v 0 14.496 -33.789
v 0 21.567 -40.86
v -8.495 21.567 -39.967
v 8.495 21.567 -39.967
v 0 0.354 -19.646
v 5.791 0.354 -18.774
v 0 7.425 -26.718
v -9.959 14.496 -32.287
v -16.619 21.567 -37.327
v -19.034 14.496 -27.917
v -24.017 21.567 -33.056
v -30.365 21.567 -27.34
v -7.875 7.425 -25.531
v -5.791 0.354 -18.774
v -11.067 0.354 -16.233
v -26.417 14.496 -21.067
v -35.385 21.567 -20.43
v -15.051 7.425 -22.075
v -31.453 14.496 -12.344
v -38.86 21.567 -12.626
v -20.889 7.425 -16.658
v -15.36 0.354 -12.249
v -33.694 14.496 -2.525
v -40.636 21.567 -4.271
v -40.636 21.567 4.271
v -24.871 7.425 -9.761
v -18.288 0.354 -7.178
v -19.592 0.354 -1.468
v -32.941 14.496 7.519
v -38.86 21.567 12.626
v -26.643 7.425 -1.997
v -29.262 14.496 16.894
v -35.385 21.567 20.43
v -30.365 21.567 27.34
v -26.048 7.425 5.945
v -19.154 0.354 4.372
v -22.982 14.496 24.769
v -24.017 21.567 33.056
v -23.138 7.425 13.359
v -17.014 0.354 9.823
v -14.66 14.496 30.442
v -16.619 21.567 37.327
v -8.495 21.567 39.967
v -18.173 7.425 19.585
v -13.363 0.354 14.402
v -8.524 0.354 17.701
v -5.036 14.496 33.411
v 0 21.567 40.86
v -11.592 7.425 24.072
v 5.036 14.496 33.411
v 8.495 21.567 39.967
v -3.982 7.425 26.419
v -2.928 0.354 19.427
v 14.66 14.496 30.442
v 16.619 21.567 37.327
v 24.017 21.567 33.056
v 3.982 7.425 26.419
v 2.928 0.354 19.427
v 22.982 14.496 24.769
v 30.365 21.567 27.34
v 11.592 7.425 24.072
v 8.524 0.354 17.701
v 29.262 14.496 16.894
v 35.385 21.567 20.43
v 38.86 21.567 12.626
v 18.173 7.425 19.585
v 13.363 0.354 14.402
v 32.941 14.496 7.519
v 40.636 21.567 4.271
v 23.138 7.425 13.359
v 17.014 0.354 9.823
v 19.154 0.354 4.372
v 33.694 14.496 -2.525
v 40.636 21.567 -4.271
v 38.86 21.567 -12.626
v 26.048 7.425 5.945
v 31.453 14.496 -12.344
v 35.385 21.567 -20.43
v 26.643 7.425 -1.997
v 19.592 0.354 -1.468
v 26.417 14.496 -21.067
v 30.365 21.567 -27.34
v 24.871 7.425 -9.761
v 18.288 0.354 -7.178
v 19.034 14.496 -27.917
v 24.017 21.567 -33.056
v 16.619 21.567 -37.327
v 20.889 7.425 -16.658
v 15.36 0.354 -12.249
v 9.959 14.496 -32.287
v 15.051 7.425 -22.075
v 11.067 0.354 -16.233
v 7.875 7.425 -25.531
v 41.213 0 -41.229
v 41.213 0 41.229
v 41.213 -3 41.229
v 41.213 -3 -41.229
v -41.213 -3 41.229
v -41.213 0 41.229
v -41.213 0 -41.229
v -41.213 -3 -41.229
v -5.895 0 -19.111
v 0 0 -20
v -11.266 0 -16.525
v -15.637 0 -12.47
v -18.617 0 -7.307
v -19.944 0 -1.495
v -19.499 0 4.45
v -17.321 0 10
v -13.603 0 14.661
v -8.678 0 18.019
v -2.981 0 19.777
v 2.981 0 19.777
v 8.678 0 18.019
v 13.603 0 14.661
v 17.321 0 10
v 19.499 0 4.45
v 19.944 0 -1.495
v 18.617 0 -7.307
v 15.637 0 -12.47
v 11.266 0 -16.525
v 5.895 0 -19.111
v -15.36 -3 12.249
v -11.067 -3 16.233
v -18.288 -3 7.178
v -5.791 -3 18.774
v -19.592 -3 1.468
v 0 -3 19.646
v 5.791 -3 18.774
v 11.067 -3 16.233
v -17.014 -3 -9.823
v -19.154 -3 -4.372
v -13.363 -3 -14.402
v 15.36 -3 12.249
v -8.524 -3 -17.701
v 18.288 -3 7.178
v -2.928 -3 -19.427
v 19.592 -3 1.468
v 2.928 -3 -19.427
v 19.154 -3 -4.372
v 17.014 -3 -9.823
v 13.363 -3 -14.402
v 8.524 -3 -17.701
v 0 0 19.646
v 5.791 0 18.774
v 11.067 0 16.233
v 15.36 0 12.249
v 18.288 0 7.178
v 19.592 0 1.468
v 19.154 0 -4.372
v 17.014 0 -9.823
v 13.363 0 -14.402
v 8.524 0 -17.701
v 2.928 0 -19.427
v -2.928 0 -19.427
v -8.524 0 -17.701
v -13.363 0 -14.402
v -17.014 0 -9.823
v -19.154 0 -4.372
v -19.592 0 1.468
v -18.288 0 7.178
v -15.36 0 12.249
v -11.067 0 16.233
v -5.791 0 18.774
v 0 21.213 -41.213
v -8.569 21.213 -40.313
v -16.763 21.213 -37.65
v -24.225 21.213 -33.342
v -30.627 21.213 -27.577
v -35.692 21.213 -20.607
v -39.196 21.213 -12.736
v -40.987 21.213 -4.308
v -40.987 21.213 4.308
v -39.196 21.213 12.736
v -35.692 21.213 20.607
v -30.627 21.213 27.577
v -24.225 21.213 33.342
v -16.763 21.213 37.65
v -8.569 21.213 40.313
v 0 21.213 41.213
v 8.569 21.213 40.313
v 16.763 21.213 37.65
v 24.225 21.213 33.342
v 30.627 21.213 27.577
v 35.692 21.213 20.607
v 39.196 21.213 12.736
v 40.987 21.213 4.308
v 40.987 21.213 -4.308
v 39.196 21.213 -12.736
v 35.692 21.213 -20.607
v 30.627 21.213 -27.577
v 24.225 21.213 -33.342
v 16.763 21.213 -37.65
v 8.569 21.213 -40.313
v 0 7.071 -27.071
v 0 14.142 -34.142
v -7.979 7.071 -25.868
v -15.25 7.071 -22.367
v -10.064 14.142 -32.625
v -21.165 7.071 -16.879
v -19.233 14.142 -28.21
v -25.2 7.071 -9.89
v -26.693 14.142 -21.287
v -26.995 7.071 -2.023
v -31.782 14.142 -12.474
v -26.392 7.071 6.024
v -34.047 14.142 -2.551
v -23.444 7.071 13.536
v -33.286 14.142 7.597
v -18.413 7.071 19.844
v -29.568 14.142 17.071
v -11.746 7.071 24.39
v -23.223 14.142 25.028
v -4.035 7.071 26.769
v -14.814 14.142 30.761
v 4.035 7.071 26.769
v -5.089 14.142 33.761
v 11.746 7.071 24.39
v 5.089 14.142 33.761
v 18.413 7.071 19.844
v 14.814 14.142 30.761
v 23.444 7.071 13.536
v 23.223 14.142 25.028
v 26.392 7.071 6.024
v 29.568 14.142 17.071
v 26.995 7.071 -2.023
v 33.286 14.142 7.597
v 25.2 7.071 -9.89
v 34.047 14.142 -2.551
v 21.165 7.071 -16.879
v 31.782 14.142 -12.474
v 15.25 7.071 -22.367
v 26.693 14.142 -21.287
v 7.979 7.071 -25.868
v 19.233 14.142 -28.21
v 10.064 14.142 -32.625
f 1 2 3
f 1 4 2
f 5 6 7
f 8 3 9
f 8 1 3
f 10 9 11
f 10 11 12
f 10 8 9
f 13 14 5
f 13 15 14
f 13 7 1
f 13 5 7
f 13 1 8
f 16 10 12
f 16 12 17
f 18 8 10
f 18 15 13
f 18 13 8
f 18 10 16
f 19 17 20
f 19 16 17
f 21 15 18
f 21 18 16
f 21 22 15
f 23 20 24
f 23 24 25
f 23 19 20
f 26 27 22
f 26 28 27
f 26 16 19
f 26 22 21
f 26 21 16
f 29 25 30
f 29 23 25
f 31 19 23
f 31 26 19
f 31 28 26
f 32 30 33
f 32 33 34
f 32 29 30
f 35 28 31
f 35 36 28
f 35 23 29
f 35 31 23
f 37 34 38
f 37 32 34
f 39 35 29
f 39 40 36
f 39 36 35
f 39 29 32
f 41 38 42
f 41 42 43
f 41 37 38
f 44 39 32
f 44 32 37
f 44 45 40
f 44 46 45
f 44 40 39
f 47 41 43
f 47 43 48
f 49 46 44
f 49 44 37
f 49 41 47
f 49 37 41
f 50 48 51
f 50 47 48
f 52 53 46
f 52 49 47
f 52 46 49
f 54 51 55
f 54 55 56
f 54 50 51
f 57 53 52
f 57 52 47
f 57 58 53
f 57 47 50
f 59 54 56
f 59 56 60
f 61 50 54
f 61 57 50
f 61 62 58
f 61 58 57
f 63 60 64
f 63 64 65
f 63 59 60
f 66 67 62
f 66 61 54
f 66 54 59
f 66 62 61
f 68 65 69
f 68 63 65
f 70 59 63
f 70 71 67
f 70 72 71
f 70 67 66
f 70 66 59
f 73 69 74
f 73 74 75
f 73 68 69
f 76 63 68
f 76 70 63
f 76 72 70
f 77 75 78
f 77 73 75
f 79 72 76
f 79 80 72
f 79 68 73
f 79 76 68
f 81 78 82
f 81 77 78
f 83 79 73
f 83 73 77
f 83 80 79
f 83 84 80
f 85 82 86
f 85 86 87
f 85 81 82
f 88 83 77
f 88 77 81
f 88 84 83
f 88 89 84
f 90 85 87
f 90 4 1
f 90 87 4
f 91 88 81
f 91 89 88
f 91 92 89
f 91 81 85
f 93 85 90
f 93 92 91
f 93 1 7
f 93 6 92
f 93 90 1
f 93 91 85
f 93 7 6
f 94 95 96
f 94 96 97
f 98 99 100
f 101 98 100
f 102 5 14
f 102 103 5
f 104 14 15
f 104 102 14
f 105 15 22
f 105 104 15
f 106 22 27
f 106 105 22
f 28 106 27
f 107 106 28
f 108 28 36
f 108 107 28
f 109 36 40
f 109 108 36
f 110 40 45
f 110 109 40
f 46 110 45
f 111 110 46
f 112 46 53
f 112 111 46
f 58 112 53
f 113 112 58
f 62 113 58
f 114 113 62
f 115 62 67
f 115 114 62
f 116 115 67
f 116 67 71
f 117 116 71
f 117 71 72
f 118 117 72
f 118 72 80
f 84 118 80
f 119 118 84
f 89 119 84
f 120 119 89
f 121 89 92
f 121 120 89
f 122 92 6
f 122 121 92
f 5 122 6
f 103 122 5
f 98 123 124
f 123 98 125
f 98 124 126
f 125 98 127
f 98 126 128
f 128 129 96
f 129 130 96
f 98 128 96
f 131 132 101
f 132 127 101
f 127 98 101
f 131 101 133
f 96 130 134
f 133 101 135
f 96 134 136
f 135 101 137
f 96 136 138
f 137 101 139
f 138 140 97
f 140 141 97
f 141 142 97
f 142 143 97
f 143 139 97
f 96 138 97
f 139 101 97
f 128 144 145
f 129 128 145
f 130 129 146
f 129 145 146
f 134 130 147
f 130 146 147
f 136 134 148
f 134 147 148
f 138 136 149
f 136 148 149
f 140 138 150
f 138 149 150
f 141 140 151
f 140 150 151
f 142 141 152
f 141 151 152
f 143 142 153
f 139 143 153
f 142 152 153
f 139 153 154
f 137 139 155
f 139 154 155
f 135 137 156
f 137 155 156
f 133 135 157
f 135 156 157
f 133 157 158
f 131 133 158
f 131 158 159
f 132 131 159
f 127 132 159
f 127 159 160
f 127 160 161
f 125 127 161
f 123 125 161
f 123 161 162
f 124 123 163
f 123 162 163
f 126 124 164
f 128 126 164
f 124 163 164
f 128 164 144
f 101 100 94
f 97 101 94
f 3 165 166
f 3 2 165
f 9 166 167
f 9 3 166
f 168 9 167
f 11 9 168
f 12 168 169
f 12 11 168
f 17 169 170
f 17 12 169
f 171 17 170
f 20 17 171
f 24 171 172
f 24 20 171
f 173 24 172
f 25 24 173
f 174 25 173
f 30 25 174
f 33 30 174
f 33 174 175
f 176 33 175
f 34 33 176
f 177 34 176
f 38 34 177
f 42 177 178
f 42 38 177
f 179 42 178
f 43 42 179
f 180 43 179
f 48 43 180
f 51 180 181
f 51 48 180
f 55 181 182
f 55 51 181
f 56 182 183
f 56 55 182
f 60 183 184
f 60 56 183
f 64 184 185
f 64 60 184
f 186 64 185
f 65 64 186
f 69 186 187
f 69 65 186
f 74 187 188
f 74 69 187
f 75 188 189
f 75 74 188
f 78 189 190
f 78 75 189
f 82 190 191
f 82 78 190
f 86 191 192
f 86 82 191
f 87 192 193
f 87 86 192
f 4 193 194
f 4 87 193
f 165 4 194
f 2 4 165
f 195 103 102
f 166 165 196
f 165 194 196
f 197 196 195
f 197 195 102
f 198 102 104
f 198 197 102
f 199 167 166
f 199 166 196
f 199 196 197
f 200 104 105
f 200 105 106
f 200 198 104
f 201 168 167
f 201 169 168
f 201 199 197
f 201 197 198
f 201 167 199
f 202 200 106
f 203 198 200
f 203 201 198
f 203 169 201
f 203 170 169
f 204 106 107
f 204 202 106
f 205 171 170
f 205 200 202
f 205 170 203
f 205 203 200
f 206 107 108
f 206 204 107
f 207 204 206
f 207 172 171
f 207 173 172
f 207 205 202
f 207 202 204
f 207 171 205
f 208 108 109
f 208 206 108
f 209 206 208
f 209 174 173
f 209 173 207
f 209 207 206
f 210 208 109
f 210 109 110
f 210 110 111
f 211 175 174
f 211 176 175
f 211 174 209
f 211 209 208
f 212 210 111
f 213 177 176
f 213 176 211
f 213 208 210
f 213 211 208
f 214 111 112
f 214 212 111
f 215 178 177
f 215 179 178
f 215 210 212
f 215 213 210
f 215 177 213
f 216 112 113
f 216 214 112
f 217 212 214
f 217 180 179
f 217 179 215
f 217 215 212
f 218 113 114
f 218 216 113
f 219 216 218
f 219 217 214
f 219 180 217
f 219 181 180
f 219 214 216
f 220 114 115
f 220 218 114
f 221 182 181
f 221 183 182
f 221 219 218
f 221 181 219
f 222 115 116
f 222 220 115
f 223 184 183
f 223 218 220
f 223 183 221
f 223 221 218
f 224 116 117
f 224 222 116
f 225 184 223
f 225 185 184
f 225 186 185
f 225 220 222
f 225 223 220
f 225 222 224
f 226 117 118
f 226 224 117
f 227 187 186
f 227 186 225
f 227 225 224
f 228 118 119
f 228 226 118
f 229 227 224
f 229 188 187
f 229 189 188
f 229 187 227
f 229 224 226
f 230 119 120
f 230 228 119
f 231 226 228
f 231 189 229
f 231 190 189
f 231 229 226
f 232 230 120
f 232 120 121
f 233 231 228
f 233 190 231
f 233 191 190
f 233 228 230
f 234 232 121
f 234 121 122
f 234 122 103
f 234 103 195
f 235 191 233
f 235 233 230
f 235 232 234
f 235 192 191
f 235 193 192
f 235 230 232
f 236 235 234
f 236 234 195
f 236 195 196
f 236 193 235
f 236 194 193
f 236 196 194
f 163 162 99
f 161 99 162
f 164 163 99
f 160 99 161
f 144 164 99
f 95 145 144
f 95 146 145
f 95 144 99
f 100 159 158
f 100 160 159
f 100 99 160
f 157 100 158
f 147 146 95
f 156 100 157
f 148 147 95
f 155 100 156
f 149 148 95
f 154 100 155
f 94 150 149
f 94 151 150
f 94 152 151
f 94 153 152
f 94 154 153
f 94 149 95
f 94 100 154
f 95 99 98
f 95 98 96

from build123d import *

# Parameters (mm, degrees)
SKETCH2_W           = 82.426406872
SKETCH2_H           = 82.457609212
SKETCH2_R           = 19.646446609
BOSS_EXTRUDE1_DEPTH = 3


with BuildPart() as part:
    # Sketch1 → Revolve1 (revolve)
    with BuildSketch(Plane.XY, mode=Mode.PRIVATE) as revolve1_sk:
        Polygon((-20, 0), (-41.213203436, 21.213203436), (-40.859650045, 21.566756826), (-19.646446609, 0.353553391), align=None)
    revolve(revolve1_sk.sketch.rotate(Axis((0, 0, 0), (0, 1, 0)), 270), axis=Axis((0, 0, 0), (0, 1, 0)))


with BuildPart() as body_2:
    # Sketch2 → Boss-Extrude1 (new body)
    with BuildSketch(Plane(origin=(0, 0, 0), x_dir=(1, 0, 0), z_dir=(0, 1, 0))):
        Rectangle(SKETCH2_W, SKETCH2_H)
        with Locations(Location((0, 0, 0), (0, 0, 270))):
            Circle(SKETCH2_R, mode=Mode.SUBTRACT)
    extrude(amount=-BOSS_EXTRUDE1_DEPTH)


solid = Compound([part.part, body_2.part])
